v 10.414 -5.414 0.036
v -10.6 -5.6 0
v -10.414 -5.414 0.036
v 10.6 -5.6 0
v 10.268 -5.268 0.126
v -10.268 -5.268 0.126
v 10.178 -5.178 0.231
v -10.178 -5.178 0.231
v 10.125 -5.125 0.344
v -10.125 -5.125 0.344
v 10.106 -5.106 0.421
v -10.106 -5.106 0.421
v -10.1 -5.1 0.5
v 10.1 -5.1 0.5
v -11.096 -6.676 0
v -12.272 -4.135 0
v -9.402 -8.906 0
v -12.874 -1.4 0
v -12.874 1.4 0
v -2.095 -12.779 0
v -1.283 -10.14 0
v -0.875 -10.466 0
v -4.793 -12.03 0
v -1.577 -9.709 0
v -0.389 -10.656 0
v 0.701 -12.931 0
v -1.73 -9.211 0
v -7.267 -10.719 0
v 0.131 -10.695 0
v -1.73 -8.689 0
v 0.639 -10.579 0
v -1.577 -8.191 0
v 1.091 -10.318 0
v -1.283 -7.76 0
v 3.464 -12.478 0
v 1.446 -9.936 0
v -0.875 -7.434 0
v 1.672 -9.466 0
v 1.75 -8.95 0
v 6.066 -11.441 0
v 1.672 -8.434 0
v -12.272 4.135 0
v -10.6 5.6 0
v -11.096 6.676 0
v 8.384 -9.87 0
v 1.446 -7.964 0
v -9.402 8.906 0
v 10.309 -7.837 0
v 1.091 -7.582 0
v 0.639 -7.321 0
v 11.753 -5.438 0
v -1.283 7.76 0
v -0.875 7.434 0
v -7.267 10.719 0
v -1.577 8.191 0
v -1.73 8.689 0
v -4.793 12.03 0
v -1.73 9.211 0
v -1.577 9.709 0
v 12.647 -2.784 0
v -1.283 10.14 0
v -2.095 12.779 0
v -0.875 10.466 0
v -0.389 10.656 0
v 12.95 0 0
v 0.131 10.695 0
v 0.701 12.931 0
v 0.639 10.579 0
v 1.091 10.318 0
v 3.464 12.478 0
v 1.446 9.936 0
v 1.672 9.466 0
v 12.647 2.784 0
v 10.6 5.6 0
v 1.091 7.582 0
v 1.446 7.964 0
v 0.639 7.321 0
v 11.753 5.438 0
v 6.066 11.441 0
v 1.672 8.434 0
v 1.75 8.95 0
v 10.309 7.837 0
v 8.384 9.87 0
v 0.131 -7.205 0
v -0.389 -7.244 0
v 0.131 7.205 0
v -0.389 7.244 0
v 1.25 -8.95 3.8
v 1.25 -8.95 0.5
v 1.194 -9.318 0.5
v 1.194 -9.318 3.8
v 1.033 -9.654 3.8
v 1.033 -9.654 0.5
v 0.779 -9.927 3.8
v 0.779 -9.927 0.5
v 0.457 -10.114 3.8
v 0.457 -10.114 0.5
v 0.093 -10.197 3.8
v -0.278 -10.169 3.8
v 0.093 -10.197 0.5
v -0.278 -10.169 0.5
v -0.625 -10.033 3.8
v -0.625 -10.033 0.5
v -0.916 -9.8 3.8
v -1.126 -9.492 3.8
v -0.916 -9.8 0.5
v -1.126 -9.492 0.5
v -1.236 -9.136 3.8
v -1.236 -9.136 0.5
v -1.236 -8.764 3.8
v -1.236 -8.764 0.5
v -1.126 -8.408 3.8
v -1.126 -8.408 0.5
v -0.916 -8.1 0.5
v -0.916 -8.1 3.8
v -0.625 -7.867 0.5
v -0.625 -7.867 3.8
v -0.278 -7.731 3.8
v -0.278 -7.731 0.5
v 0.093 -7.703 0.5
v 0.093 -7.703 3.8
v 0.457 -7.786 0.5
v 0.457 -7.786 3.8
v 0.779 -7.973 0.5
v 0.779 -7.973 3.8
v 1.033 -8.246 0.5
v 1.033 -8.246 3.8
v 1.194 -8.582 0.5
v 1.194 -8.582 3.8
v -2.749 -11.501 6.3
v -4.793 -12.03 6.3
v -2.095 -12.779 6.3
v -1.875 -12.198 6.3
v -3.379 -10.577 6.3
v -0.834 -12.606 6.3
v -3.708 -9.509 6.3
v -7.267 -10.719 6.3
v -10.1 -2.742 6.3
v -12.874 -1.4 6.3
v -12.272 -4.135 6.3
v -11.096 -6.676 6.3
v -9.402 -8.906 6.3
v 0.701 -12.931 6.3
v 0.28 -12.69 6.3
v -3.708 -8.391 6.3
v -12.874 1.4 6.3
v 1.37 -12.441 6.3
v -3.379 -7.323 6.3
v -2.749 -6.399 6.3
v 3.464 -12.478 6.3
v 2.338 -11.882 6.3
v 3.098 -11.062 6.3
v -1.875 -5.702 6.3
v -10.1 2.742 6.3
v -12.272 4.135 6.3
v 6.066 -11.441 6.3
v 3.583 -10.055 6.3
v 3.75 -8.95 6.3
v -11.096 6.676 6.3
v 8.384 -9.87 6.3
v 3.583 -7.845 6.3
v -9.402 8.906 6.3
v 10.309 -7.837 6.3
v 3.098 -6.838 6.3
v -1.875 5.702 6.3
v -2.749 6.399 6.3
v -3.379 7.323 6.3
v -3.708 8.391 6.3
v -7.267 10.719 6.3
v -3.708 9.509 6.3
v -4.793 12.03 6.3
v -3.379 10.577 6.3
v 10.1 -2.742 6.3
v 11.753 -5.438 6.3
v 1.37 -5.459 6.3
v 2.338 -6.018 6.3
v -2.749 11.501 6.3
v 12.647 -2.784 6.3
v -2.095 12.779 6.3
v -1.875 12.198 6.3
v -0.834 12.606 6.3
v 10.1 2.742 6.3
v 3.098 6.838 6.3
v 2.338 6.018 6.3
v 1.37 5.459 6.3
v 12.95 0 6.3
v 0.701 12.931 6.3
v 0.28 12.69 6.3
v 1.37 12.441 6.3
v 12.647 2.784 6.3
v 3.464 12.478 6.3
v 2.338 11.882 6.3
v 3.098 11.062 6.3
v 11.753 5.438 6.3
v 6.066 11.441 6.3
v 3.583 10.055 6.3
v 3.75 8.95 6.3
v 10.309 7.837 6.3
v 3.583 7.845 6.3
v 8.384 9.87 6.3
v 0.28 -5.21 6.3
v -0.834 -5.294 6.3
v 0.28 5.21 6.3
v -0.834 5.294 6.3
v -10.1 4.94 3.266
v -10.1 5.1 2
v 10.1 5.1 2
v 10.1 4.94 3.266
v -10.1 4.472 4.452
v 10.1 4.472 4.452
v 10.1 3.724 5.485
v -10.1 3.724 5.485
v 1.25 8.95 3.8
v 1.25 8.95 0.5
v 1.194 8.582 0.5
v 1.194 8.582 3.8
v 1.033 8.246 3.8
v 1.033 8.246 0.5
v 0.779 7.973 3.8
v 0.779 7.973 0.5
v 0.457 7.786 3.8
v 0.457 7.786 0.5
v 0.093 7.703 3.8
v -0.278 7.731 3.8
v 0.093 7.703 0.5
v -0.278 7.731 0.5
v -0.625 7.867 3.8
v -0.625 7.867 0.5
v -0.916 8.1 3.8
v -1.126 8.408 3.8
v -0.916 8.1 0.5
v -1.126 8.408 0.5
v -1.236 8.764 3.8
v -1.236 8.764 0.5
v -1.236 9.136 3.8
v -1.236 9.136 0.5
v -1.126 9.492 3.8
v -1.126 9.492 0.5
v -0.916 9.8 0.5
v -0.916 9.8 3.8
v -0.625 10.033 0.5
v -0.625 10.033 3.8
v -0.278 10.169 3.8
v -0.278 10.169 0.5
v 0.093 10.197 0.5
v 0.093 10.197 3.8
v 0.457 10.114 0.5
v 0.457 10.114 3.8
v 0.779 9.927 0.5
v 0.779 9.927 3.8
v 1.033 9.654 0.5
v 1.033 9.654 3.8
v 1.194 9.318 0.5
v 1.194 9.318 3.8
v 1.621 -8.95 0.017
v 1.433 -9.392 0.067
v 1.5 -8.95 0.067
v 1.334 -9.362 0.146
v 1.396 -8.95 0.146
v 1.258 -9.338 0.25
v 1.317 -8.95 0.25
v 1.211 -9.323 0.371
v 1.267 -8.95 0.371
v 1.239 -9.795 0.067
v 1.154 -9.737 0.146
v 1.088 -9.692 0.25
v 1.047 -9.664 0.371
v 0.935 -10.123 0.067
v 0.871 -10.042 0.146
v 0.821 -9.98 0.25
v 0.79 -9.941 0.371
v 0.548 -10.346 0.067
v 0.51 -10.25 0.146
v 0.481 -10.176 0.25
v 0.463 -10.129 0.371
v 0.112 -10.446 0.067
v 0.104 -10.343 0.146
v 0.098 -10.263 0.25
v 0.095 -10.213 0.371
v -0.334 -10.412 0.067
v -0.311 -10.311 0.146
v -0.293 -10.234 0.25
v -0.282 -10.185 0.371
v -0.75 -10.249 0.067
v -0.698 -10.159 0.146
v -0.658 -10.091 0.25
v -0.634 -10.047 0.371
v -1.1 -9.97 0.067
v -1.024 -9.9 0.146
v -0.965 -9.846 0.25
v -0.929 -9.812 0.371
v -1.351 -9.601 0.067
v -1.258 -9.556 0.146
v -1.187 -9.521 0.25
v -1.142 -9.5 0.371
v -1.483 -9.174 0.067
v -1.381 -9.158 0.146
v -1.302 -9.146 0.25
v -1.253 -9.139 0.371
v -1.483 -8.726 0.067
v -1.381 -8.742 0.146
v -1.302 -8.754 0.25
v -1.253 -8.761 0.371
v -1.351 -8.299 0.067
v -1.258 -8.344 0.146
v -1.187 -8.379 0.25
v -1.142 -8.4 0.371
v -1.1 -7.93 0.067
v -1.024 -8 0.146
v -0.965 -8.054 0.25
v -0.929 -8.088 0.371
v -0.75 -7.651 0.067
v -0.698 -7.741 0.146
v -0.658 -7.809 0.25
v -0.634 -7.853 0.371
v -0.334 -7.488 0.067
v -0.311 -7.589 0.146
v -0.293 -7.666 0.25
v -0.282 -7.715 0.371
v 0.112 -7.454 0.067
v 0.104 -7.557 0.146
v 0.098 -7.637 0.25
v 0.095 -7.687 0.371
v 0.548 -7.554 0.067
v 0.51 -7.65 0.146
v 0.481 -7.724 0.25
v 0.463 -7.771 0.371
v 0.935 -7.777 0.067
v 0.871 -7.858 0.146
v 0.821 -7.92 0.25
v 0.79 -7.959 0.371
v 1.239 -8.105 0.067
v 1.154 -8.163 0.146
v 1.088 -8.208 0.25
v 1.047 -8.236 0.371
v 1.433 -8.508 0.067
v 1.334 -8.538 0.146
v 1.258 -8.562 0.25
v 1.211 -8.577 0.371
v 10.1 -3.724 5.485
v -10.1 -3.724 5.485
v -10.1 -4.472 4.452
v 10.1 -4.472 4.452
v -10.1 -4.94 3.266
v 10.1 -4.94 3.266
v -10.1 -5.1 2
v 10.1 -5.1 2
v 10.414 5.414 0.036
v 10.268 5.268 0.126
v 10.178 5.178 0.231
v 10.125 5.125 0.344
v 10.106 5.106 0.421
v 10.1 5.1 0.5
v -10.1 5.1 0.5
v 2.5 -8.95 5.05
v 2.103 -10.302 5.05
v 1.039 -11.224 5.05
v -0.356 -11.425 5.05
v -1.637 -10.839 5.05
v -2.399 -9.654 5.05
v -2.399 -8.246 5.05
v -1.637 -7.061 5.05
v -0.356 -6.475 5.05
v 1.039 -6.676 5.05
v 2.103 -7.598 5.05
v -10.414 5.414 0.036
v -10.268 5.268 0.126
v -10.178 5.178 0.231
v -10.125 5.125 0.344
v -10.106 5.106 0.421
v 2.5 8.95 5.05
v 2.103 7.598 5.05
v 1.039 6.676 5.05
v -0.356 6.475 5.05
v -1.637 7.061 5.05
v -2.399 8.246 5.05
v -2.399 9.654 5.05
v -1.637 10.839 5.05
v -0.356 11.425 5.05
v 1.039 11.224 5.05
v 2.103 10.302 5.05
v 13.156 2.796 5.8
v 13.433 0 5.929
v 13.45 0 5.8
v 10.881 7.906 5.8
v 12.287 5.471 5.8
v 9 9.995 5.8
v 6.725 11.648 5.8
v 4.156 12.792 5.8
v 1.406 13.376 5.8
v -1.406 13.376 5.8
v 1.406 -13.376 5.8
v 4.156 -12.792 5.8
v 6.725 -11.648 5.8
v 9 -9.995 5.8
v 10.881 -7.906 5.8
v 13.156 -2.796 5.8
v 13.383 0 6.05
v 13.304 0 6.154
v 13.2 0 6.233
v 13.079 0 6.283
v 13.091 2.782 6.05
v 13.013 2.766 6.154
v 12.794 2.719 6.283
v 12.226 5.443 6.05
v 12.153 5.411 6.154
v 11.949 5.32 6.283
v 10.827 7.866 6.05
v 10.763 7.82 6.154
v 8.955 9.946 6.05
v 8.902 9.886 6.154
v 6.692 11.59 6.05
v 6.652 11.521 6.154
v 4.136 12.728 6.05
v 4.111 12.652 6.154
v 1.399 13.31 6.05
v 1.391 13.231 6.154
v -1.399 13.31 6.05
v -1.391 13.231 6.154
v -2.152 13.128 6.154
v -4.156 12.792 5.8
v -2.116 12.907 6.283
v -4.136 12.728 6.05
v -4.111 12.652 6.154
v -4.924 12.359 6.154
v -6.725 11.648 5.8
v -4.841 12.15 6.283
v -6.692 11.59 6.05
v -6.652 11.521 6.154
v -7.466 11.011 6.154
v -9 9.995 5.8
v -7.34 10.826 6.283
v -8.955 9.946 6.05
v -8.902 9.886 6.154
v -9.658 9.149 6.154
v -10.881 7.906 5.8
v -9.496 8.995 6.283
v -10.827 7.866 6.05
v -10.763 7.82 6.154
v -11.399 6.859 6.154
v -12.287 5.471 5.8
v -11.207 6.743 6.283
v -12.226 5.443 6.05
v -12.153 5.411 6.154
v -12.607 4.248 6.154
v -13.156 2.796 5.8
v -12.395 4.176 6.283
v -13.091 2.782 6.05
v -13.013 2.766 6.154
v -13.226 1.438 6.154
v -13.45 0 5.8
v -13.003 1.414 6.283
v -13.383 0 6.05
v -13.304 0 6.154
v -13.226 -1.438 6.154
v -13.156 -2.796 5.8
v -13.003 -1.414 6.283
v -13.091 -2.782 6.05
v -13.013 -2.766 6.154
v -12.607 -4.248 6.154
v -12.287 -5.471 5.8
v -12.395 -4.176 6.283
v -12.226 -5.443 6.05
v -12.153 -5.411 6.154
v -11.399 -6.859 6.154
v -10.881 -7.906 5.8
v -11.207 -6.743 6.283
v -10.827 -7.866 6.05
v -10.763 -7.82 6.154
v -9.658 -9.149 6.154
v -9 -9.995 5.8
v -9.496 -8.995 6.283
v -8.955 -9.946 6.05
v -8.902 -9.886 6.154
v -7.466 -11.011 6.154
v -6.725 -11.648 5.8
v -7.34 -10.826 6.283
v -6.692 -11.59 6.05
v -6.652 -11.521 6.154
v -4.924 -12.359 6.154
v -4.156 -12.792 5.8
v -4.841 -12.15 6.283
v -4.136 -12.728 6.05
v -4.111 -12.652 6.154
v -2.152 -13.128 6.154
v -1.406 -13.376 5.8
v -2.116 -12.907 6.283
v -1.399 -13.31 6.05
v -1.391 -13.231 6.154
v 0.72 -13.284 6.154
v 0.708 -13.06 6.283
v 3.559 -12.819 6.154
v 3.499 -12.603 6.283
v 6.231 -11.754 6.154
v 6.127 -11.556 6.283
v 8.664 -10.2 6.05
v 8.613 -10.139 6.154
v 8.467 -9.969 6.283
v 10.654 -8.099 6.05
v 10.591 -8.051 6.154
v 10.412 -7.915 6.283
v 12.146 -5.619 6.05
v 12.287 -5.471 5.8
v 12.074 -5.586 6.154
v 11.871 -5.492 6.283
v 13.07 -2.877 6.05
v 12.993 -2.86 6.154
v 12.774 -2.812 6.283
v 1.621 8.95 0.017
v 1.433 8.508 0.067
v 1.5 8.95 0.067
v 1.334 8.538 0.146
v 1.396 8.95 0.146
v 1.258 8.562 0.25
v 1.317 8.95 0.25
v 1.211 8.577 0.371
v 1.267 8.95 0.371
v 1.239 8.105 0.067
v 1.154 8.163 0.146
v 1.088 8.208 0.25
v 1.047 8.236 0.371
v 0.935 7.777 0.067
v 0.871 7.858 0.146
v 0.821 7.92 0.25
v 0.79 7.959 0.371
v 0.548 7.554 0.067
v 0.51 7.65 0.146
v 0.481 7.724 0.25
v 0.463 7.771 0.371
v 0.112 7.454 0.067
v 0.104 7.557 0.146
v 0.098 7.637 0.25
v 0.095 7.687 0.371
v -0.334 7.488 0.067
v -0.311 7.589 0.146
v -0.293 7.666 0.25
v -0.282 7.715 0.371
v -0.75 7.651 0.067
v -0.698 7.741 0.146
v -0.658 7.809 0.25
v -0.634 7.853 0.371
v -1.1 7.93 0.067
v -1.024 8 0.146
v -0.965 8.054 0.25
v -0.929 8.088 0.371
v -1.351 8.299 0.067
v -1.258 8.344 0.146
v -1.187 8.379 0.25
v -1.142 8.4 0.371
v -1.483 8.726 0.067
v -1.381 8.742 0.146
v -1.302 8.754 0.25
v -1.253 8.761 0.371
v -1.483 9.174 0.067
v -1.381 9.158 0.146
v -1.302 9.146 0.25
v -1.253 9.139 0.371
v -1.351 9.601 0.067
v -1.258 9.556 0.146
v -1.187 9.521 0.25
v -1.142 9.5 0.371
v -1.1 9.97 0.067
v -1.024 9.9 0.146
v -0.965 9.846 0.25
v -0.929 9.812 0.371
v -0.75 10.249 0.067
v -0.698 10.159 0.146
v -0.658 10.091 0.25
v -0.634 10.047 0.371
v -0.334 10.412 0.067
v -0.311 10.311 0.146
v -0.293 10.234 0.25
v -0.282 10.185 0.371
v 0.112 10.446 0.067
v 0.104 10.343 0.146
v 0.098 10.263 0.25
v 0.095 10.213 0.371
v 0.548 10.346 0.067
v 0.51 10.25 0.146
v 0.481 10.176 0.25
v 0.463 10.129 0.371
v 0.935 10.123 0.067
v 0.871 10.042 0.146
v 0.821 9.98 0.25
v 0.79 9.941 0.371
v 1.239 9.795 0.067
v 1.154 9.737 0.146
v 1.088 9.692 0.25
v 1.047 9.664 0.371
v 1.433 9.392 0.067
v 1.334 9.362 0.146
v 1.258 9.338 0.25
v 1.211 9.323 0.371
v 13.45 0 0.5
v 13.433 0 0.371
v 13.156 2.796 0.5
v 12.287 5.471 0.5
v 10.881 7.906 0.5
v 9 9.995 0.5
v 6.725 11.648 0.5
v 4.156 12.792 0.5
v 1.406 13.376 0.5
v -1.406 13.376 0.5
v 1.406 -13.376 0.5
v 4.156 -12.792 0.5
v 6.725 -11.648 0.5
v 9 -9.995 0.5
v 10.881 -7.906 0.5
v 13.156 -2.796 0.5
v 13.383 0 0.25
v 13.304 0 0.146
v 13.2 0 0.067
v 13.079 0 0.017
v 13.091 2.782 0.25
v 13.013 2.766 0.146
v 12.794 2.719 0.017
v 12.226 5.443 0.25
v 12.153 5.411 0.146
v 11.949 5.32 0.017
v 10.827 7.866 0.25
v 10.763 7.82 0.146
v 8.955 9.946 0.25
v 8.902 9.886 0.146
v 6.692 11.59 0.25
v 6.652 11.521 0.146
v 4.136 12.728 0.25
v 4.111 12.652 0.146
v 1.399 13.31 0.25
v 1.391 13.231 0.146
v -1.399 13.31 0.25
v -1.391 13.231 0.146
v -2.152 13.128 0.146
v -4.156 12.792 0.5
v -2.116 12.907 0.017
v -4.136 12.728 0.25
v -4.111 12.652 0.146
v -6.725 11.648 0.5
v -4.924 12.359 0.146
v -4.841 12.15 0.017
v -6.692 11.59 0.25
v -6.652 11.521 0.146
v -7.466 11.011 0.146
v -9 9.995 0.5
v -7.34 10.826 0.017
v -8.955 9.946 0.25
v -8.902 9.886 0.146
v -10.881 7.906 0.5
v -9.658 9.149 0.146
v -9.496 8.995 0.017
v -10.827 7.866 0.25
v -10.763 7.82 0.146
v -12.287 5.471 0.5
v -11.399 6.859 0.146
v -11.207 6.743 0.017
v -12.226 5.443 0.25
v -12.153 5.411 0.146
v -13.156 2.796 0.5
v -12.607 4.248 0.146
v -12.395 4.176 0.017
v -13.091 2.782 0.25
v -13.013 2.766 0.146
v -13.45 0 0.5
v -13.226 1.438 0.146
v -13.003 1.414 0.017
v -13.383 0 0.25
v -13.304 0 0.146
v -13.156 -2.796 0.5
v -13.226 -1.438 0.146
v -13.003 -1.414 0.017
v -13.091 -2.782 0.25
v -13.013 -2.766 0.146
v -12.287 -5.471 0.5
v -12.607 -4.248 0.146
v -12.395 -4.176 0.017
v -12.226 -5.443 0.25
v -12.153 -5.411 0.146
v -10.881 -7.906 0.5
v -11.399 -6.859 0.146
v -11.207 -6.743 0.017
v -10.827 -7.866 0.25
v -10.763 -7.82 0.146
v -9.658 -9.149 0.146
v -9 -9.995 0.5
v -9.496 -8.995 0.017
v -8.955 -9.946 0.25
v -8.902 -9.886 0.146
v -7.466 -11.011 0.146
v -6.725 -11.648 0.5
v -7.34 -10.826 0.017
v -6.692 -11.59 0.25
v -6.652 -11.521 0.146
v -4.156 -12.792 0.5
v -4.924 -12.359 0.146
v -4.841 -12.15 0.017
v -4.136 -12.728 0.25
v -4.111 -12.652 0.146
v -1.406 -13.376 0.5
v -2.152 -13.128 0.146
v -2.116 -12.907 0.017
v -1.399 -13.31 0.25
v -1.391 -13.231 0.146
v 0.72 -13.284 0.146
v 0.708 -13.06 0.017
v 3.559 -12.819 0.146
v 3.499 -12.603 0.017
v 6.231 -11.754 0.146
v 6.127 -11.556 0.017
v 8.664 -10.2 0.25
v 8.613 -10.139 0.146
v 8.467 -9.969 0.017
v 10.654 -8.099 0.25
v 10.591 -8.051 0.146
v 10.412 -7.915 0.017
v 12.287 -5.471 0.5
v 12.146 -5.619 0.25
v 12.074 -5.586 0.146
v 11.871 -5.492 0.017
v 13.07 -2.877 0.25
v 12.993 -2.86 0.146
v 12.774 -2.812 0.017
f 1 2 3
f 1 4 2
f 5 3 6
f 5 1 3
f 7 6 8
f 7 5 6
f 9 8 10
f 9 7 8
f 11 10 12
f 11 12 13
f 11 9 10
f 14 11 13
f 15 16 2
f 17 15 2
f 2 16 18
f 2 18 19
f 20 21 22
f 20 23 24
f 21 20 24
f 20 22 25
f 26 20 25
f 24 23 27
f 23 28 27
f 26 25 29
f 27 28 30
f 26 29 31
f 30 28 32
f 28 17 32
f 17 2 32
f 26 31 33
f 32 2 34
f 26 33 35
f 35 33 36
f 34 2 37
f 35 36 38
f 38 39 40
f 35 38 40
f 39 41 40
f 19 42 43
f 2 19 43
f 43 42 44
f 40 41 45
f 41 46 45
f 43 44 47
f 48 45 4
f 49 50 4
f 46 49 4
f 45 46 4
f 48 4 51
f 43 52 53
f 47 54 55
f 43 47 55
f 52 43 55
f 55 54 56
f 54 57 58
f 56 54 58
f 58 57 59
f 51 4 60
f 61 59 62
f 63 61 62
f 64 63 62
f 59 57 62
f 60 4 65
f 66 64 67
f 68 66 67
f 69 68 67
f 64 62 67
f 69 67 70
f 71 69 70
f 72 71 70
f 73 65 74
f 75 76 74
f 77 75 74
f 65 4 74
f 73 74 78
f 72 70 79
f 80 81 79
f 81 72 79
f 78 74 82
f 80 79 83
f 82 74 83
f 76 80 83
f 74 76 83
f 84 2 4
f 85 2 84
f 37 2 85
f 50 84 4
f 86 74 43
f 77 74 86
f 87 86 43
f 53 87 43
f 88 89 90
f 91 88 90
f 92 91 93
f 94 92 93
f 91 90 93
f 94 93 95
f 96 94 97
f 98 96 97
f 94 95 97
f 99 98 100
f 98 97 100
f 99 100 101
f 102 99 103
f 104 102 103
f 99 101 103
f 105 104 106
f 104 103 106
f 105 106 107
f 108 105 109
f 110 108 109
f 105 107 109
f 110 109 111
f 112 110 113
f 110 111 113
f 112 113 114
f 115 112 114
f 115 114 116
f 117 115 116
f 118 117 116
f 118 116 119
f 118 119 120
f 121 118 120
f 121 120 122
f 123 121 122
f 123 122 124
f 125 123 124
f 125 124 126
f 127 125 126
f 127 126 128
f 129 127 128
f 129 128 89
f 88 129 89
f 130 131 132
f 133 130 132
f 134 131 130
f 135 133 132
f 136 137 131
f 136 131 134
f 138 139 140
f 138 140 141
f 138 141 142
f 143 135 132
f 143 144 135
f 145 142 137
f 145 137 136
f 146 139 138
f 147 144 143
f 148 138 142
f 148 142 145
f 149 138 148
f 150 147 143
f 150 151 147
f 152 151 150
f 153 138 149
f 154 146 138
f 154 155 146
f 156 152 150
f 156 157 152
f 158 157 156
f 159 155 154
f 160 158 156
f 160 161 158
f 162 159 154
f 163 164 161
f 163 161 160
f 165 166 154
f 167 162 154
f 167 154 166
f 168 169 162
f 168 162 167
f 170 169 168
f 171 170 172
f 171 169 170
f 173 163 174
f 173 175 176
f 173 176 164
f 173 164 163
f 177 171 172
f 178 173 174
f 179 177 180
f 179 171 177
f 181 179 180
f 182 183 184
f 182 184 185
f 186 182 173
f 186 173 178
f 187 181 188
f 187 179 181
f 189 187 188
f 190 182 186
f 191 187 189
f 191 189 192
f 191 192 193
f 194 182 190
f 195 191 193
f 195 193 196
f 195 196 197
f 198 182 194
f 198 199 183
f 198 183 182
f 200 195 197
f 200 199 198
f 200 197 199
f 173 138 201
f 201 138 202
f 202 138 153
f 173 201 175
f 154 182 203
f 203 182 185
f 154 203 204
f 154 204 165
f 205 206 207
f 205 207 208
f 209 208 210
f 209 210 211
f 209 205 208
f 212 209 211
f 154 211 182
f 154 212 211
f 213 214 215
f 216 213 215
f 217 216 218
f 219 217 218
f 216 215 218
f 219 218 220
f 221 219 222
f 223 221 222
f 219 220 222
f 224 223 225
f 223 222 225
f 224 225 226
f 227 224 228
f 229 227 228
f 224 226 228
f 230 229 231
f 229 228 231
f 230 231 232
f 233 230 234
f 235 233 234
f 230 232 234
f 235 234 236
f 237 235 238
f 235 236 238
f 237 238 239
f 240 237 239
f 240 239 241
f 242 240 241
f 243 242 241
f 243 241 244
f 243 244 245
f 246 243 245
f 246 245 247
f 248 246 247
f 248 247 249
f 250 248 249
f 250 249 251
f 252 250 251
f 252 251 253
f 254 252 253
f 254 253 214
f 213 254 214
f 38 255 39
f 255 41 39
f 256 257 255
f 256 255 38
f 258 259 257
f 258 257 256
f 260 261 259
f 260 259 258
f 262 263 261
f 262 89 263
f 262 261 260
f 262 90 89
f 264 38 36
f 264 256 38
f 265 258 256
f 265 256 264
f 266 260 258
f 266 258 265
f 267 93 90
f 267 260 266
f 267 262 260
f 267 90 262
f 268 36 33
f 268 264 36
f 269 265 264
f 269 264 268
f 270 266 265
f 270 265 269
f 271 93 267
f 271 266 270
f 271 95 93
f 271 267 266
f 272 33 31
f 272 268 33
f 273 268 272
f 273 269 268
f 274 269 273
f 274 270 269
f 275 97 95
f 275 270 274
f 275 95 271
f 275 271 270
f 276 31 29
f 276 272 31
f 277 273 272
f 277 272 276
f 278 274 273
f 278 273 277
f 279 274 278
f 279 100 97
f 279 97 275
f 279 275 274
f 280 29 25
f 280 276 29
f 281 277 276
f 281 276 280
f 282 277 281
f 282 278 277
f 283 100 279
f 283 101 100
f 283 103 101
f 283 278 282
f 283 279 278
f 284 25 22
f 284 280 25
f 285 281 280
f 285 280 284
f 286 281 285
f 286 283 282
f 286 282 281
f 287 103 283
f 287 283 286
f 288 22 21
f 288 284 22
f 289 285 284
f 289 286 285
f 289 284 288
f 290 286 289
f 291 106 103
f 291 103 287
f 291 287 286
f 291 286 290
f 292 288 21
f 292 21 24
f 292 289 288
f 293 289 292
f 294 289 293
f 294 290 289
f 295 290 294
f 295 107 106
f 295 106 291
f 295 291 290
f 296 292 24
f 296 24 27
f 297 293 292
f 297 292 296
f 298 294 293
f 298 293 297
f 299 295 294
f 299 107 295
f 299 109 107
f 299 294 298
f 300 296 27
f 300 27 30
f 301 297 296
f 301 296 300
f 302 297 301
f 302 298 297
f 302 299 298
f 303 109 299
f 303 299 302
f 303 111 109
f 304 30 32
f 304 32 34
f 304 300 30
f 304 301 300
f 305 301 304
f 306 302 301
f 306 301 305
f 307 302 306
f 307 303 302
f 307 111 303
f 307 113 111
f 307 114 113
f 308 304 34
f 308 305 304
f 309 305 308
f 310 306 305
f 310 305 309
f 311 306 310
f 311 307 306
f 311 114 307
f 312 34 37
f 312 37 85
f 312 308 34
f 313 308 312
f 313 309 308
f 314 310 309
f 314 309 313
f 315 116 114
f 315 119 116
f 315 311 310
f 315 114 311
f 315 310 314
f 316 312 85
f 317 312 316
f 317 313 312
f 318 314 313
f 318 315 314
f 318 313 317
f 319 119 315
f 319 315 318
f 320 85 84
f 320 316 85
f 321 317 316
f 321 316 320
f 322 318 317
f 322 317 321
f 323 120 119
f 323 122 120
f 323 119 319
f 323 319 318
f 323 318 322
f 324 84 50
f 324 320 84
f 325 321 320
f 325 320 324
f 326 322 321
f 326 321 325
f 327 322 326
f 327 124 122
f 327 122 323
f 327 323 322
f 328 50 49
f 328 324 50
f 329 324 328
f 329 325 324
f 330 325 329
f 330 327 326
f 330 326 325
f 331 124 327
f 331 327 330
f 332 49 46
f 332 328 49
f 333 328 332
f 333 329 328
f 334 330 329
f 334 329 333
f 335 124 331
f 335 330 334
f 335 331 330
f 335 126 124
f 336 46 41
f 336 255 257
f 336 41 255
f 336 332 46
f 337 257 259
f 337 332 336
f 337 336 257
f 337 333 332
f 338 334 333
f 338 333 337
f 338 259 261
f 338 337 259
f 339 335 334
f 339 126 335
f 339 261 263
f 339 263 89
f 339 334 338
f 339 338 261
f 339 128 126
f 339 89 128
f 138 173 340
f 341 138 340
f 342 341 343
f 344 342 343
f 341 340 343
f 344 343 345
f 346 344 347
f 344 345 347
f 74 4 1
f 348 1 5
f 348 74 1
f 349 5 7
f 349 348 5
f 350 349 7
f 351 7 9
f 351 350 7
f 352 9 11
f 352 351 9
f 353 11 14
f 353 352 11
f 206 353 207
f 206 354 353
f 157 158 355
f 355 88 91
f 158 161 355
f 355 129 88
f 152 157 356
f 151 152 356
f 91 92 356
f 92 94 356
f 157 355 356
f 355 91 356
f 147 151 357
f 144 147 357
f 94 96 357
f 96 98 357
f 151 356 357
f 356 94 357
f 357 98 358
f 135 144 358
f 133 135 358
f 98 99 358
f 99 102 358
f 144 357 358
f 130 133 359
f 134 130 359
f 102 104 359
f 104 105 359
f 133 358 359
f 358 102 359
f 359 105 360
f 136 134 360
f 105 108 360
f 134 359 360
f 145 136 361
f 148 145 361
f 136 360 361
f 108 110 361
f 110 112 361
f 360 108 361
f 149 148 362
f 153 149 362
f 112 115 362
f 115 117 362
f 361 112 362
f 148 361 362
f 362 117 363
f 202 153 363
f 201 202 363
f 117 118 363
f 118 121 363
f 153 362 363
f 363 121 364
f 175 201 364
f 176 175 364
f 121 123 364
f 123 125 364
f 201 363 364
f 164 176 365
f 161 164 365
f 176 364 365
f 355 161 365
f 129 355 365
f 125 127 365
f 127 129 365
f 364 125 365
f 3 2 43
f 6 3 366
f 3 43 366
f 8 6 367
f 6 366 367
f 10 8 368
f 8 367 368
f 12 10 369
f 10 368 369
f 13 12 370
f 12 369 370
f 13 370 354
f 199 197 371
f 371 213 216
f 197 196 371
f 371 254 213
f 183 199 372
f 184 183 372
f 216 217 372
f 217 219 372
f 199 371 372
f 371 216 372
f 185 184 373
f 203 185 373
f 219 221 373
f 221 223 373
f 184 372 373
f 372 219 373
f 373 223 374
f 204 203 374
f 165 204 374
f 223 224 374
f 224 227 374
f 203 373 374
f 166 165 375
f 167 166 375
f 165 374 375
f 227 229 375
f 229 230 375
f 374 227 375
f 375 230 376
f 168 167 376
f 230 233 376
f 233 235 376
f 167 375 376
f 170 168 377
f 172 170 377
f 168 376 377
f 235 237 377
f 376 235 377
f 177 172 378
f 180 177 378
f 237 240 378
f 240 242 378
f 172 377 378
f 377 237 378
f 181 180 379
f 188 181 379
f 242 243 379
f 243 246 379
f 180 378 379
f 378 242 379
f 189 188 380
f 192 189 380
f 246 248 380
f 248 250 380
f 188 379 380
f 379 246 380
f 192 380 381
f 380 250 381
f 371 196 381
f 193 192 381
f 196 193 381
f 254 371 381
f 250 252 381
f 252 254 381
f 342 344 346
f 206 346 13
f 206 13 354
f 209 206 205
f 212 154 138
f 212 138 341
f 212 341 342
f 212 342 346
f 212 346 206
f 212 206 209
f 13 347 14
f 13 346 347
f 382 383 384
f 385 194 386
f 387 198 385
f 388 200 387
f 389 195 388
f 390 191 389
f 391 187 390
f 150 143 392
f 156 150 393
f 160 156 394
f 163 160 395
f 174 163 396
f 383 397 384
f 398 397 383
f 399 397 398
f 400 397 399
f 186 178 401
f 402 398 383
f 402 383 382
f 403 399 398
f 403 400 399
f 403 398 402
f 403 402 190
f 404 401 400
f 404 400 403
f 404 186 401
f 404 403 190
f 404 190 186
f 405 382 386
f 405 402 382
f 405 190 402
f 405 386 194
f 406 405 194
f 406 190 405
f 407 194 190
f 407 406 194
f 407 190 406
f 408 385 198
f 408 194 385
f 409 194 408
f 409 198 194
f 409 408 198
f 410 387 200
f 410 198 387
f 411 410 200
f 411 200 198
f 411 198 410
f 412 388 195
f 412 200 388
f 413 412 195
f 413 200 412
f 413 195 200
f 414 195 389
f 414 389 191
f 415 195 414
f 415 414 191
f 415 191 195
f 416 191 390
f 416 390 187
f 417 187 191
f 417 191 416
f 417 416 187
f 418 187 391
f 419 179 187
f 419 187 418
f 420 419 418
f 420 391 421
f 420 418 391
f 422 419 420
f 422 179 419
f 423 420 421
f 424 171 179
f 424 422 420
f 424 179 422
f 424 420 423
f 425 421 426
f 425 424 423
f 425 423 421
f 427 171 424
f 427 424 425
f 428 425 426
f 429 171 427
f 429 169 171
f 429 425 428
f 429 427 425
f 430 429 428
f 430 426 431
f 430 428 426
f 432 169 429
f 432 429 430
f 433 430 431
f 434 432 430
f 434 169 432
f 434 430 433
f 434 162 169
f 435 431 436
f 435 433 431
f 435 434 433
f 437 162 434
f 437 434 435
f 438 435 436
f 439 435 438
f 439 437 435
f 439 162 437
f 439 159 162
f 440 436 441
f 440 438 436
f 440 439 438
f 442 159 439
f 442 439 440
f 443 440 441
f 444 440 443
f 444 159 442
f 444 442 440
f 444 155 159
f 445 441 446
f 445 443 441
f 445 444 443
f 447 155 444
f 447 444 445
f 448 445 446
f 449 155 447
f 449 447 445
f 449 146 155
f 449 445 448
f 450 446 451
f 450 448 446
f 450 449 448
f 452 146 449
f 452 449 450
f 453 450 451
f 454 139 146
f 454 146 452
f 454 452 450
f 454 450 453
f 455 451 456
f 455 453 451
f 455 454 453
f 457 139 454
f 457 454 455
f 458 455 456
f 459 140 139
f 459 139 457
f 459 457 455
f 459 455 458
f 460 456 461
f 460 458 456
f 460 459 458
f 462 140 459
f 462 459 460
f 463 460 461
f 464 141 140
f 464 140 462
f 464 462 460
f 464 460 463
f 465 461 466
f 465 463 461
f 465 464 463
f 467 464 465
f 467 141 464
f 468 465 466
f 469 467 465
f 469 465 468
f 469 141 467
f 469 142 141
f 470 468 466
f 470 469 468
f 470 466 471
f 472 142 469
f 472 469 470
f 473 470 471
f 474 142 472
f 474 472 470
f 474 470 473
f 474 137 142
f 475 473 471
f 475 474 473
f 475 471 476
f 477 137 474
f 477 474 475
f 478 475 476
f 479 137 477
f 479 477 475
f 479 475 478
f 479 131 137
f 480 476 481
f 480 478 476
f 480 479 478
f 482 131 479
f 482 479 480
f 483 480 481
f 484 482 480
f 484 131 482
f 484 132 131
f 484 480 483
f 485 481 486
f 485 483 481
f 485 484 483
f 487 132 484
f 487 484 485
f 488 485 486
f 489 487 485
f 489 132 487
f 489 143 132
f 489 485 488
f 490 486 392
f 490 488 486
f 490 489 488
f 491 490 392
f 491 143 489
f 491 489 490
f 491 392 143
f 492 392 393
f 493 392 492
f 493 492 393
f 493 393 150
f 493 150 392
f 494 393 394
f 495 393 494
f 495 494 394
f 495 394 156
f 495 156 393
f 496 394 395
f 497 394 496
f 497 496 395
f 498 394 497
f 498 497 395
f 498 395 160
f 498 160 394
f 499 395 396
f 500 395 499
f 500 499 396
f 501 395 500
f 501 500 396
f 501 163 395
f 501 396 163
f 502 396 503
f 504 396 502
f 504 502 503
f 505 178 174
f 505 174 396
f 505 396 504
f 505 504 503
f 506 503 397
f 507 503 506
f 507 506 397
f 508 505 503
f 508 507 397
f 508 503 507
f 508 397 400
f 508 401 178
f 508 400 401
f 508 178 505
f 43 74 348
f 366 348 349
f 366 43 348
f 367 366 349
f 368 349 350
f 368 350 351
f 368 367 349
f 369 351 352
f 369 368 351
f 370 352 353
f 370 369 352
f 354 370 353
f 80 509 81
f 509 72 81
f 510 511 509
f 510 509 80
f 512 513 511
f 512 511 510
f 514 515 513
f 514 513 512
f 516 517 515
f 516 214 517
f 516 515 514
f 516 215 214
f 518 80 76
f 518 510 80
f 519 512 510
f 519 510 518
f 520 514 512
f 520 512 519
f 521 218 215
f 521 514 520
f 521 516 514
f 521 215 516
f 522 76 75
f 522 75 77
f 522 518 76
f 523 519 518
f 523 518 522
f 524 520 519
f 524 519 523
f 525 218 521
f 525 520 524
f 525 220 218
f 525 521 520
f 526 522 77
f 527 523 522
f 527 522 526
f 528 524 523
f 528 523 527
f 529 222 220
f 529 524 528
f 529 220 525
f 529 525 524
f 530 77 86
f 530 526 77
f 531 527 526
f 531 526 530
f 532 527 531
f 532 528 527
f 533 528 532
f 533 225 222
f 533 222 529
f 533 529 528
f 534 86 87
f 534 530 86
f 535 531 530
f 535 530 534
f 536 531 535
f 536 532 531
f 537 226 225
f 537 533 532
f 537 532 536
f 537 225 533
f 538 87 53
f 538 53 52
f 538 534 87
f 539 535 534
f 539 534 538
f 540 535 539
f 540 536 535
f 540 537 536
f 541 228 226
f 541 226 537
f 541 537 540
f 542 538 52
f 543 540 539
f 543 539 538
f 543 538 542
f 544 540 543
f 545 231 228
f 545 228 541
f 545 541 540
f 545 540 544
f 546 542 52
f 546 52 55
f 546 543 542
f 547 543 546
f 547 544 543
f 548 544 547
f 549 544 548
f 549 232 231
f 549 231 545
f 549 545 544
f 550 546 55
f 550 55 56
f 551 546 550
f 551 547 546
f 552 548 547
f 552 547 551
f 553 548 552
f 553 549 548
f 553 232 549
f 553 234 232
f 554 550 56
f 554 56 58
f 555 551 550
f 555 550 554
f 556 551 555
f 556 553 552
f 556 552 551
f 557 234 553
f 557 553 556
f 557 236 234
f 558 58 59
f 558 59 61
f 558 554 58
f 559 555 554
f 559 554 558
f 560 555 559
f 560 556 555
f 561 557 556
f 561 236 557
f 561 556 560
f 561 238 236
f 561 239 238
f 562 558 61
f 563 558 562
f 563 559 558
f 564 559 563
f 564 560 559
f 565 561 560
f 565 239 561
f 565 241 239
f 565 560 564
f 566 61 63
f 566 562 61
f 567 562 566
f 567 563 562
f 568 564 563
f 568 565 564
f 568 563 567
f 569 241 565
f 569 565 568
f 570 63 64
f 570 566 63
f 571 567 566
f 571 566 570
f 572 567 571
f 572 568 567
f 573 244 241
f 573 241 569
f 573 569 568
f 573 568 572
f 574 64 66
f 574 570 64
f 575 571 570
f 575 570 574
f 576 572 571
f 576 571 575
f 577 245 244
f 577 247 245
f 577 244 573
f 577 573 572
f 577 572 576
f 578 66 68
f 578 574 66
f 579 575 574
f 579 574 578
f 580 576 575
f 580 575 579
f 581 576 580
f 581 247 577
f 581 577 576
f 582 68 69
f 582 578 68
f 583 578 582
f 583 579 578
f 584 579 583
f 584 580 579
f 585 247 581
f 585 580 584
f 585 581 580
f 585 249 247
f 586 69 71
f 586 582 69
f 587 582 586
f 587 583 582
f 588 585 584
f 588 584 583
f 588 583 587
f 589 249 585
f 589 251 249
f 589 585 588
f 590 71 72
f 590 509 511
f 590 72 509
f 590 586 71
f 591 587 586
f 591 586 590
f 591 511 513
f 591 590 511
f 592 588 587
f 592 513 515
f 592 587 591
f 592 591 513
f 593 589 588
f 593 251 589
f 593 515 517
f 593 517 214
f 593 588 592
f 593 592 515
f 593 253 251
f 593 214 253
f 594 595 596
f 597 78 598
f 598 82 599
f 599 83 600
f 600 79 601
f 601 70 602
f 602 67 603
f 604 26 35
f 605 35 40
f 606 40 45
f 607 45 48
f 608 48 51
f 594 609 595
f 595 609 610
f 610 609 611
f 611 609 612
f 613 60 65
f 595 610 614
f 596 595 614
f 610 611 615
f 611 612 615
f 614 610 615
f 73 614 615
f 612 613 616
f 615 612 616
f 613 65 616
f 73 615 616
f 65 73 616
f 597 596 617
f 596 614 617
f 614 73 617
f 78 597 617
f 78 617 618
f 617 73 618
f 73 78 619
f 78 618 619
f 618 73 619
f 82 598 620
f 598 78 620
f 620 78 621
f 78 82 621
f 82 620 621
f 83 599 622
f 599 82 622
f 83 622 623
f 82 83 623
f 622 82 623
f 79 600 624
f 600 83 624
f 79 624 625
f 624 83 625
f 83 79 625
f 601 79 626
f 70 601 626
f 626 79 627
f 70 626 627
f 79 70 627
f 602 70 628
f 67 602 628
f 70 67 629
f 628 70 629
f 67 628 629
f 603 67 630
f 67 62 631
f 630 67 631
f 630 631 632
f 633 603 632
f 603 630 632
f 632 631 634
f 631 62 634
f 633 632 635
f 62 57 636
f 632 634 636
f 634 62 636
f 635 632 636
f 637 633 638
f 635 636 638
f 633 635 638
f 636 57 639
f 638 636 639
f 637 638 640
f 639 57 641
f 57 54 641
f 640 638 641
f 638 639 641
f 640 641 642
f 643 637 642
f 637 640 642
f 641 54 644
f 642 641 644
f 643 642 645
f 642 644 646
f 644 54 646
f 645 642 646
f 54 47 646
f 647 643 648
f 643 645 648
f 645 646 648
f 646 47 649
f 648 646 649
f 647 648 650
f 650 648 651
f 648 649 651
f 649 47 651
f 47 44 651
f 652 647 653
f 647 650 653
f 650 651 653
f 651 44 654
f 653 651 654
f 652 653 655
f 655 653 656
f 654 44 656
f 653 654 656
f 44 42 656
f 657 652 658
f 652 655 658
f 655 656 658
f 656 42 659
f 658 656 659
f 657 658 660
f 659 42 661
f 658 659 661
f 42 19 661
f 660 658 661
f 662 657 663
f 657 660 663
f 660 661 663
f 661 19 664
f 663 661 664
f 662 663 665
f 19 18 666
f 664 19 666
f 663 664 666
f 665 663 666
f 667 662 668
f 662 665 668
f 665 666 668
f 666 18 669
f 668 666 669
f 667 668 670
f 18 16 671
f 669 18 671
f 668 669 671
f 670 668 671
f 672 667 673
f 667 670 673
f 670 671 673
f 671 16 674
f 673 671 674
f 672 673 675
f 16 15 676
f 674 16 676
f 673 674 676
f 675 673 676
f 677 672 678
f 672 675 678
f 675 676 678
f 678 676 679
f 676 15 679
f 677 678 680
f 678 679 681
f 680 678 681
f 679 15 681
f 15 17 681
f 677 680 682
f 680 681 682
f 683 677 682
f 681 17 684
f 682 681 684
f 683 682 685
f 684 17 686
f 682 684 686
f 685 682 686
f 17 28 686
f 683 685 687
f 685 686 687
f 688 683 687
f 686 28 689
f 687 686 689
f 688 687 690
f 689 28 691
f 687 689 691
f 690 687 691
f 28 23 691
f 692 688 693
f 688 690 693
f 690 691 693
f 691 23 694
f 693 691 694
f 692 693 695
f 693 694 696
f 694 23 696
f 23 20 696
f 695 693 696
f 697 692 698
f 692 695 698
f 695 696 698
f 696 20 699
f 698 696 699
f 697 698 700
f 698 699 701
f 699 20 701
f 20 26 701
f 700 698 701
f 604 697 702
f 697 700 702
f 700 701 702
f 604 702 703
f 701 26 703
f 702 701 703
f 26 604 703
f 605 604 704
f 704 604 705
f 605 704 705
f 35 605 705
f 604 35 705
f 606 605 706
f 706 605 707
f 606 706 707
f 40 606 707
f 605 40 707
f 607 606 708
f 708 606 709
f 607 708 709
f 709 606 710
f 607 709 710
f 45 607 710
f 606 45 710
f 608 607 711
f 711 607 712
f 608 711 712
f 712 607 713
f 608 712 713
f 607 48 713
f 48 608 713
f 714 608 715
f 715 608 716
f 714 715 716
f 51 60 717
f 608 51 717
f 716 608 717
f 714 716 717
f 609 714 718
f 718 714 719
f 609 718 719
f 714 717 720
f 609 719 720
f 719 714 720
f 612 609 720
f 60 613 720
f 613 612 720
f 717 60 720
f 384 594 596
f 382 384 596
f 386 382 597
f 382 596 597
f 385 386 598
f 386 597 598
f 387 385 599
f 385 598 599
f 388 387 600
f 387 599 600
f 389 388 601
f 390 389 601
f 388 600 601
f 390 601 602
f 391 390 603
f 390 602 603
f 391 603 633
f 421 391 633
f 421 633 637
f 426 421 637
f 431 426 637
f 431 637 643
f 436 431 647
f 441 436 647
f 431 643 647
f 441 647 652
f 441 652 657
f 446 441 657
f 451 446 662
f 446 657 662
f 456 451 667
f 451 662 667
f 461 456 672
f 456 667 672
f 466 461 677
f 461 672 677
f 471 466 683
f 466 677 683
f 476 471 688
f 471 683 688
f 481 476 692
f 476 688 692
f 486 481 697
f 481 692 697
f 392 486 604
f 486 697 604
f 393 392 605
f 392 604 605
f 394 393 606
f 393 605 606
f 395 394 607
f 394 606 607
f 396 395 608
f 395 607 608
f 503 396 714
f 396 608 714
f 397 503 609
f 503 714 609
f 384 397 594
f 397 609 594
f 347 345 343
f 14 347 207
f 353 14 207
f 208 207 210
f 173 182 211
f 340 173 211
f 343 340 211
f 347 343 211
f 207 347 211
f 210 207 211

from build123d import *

# Parameters (mm, degrees)
F0_R          = 13.45
F1_DEPTH      = 6.3
F3_DEPTH      = 10.1
F3_DEPTH_BACK = 10.1
F4_R          = 1.25
F5_DEPTH      = 10
F6_R          = 0.5
F7_SIZE       = 2.5


with BuildPart() as f1:
    # F0 (on Top) → F1 (new body)
    with BuildSketch(Plane.XY):
        Circle(F0_R)
    extrude(amount=F1_DEPTH)

    # F2 (on Right) → F3 (cut, two sides)
    with BuildSketch(Plane.YZ) as f3_sk:
        with BuildLine():
            Line((5.1, 0), (5.1, 2))
            ThreePointArc((5.1, 2), (0, 7.1), (-5.1, 2))
            Line((-5.1, 2), (-5.1, 0))
            Line((-5.1, 0), (5.1, 0))
        make_face()
    extrude(amount=F3_DEPTH, mode=Mode.SUBTRACT)
    extrude(f3_sk.sketch, amount=-F3_DEPTH_BACK, mode=Mode.SUBTRACT)

    # F4 (on face) → F5 (cut)
    with BuildSketch(Plane(origin=(0, 0, 0), x_dir=(1, 0, 0), z_dir=(0, 0, -1))):
        with Locations((0, 8.95)):
            Circle(F4_R)
        with Locations((0, -8.95)):
            Circle(F4_R)
    extrude(amount=-F5_DEPTH, mode=Mode.SUBTRACT)

    # F6
    f6_edges = [f1.edges().sort_by_distance(p)[0] for p in [
        (-13.45, 0, 0),
        (-1.25, -8.95, 0),
        (0, -5.1, 0),
        (-10.1, 0, 0),
        (10.1, 0, 0),
        (0, 5.1, 0),
        (-1.25, 8.95, 0),
        (-13.45, 0, 6.3),
    ]]
    fillet(f6_edges, radius=F6_R)

    # F7
    f7_edges = [f1.edges().sort_by_distance(p)[0] for p in [
        (-1.25, -8.95, 6.3),
        (-1.25, 8.95, 6.3),
    ]]
    chamfer(f7_edges, length=F7_SIZE)


solid = f1.part
